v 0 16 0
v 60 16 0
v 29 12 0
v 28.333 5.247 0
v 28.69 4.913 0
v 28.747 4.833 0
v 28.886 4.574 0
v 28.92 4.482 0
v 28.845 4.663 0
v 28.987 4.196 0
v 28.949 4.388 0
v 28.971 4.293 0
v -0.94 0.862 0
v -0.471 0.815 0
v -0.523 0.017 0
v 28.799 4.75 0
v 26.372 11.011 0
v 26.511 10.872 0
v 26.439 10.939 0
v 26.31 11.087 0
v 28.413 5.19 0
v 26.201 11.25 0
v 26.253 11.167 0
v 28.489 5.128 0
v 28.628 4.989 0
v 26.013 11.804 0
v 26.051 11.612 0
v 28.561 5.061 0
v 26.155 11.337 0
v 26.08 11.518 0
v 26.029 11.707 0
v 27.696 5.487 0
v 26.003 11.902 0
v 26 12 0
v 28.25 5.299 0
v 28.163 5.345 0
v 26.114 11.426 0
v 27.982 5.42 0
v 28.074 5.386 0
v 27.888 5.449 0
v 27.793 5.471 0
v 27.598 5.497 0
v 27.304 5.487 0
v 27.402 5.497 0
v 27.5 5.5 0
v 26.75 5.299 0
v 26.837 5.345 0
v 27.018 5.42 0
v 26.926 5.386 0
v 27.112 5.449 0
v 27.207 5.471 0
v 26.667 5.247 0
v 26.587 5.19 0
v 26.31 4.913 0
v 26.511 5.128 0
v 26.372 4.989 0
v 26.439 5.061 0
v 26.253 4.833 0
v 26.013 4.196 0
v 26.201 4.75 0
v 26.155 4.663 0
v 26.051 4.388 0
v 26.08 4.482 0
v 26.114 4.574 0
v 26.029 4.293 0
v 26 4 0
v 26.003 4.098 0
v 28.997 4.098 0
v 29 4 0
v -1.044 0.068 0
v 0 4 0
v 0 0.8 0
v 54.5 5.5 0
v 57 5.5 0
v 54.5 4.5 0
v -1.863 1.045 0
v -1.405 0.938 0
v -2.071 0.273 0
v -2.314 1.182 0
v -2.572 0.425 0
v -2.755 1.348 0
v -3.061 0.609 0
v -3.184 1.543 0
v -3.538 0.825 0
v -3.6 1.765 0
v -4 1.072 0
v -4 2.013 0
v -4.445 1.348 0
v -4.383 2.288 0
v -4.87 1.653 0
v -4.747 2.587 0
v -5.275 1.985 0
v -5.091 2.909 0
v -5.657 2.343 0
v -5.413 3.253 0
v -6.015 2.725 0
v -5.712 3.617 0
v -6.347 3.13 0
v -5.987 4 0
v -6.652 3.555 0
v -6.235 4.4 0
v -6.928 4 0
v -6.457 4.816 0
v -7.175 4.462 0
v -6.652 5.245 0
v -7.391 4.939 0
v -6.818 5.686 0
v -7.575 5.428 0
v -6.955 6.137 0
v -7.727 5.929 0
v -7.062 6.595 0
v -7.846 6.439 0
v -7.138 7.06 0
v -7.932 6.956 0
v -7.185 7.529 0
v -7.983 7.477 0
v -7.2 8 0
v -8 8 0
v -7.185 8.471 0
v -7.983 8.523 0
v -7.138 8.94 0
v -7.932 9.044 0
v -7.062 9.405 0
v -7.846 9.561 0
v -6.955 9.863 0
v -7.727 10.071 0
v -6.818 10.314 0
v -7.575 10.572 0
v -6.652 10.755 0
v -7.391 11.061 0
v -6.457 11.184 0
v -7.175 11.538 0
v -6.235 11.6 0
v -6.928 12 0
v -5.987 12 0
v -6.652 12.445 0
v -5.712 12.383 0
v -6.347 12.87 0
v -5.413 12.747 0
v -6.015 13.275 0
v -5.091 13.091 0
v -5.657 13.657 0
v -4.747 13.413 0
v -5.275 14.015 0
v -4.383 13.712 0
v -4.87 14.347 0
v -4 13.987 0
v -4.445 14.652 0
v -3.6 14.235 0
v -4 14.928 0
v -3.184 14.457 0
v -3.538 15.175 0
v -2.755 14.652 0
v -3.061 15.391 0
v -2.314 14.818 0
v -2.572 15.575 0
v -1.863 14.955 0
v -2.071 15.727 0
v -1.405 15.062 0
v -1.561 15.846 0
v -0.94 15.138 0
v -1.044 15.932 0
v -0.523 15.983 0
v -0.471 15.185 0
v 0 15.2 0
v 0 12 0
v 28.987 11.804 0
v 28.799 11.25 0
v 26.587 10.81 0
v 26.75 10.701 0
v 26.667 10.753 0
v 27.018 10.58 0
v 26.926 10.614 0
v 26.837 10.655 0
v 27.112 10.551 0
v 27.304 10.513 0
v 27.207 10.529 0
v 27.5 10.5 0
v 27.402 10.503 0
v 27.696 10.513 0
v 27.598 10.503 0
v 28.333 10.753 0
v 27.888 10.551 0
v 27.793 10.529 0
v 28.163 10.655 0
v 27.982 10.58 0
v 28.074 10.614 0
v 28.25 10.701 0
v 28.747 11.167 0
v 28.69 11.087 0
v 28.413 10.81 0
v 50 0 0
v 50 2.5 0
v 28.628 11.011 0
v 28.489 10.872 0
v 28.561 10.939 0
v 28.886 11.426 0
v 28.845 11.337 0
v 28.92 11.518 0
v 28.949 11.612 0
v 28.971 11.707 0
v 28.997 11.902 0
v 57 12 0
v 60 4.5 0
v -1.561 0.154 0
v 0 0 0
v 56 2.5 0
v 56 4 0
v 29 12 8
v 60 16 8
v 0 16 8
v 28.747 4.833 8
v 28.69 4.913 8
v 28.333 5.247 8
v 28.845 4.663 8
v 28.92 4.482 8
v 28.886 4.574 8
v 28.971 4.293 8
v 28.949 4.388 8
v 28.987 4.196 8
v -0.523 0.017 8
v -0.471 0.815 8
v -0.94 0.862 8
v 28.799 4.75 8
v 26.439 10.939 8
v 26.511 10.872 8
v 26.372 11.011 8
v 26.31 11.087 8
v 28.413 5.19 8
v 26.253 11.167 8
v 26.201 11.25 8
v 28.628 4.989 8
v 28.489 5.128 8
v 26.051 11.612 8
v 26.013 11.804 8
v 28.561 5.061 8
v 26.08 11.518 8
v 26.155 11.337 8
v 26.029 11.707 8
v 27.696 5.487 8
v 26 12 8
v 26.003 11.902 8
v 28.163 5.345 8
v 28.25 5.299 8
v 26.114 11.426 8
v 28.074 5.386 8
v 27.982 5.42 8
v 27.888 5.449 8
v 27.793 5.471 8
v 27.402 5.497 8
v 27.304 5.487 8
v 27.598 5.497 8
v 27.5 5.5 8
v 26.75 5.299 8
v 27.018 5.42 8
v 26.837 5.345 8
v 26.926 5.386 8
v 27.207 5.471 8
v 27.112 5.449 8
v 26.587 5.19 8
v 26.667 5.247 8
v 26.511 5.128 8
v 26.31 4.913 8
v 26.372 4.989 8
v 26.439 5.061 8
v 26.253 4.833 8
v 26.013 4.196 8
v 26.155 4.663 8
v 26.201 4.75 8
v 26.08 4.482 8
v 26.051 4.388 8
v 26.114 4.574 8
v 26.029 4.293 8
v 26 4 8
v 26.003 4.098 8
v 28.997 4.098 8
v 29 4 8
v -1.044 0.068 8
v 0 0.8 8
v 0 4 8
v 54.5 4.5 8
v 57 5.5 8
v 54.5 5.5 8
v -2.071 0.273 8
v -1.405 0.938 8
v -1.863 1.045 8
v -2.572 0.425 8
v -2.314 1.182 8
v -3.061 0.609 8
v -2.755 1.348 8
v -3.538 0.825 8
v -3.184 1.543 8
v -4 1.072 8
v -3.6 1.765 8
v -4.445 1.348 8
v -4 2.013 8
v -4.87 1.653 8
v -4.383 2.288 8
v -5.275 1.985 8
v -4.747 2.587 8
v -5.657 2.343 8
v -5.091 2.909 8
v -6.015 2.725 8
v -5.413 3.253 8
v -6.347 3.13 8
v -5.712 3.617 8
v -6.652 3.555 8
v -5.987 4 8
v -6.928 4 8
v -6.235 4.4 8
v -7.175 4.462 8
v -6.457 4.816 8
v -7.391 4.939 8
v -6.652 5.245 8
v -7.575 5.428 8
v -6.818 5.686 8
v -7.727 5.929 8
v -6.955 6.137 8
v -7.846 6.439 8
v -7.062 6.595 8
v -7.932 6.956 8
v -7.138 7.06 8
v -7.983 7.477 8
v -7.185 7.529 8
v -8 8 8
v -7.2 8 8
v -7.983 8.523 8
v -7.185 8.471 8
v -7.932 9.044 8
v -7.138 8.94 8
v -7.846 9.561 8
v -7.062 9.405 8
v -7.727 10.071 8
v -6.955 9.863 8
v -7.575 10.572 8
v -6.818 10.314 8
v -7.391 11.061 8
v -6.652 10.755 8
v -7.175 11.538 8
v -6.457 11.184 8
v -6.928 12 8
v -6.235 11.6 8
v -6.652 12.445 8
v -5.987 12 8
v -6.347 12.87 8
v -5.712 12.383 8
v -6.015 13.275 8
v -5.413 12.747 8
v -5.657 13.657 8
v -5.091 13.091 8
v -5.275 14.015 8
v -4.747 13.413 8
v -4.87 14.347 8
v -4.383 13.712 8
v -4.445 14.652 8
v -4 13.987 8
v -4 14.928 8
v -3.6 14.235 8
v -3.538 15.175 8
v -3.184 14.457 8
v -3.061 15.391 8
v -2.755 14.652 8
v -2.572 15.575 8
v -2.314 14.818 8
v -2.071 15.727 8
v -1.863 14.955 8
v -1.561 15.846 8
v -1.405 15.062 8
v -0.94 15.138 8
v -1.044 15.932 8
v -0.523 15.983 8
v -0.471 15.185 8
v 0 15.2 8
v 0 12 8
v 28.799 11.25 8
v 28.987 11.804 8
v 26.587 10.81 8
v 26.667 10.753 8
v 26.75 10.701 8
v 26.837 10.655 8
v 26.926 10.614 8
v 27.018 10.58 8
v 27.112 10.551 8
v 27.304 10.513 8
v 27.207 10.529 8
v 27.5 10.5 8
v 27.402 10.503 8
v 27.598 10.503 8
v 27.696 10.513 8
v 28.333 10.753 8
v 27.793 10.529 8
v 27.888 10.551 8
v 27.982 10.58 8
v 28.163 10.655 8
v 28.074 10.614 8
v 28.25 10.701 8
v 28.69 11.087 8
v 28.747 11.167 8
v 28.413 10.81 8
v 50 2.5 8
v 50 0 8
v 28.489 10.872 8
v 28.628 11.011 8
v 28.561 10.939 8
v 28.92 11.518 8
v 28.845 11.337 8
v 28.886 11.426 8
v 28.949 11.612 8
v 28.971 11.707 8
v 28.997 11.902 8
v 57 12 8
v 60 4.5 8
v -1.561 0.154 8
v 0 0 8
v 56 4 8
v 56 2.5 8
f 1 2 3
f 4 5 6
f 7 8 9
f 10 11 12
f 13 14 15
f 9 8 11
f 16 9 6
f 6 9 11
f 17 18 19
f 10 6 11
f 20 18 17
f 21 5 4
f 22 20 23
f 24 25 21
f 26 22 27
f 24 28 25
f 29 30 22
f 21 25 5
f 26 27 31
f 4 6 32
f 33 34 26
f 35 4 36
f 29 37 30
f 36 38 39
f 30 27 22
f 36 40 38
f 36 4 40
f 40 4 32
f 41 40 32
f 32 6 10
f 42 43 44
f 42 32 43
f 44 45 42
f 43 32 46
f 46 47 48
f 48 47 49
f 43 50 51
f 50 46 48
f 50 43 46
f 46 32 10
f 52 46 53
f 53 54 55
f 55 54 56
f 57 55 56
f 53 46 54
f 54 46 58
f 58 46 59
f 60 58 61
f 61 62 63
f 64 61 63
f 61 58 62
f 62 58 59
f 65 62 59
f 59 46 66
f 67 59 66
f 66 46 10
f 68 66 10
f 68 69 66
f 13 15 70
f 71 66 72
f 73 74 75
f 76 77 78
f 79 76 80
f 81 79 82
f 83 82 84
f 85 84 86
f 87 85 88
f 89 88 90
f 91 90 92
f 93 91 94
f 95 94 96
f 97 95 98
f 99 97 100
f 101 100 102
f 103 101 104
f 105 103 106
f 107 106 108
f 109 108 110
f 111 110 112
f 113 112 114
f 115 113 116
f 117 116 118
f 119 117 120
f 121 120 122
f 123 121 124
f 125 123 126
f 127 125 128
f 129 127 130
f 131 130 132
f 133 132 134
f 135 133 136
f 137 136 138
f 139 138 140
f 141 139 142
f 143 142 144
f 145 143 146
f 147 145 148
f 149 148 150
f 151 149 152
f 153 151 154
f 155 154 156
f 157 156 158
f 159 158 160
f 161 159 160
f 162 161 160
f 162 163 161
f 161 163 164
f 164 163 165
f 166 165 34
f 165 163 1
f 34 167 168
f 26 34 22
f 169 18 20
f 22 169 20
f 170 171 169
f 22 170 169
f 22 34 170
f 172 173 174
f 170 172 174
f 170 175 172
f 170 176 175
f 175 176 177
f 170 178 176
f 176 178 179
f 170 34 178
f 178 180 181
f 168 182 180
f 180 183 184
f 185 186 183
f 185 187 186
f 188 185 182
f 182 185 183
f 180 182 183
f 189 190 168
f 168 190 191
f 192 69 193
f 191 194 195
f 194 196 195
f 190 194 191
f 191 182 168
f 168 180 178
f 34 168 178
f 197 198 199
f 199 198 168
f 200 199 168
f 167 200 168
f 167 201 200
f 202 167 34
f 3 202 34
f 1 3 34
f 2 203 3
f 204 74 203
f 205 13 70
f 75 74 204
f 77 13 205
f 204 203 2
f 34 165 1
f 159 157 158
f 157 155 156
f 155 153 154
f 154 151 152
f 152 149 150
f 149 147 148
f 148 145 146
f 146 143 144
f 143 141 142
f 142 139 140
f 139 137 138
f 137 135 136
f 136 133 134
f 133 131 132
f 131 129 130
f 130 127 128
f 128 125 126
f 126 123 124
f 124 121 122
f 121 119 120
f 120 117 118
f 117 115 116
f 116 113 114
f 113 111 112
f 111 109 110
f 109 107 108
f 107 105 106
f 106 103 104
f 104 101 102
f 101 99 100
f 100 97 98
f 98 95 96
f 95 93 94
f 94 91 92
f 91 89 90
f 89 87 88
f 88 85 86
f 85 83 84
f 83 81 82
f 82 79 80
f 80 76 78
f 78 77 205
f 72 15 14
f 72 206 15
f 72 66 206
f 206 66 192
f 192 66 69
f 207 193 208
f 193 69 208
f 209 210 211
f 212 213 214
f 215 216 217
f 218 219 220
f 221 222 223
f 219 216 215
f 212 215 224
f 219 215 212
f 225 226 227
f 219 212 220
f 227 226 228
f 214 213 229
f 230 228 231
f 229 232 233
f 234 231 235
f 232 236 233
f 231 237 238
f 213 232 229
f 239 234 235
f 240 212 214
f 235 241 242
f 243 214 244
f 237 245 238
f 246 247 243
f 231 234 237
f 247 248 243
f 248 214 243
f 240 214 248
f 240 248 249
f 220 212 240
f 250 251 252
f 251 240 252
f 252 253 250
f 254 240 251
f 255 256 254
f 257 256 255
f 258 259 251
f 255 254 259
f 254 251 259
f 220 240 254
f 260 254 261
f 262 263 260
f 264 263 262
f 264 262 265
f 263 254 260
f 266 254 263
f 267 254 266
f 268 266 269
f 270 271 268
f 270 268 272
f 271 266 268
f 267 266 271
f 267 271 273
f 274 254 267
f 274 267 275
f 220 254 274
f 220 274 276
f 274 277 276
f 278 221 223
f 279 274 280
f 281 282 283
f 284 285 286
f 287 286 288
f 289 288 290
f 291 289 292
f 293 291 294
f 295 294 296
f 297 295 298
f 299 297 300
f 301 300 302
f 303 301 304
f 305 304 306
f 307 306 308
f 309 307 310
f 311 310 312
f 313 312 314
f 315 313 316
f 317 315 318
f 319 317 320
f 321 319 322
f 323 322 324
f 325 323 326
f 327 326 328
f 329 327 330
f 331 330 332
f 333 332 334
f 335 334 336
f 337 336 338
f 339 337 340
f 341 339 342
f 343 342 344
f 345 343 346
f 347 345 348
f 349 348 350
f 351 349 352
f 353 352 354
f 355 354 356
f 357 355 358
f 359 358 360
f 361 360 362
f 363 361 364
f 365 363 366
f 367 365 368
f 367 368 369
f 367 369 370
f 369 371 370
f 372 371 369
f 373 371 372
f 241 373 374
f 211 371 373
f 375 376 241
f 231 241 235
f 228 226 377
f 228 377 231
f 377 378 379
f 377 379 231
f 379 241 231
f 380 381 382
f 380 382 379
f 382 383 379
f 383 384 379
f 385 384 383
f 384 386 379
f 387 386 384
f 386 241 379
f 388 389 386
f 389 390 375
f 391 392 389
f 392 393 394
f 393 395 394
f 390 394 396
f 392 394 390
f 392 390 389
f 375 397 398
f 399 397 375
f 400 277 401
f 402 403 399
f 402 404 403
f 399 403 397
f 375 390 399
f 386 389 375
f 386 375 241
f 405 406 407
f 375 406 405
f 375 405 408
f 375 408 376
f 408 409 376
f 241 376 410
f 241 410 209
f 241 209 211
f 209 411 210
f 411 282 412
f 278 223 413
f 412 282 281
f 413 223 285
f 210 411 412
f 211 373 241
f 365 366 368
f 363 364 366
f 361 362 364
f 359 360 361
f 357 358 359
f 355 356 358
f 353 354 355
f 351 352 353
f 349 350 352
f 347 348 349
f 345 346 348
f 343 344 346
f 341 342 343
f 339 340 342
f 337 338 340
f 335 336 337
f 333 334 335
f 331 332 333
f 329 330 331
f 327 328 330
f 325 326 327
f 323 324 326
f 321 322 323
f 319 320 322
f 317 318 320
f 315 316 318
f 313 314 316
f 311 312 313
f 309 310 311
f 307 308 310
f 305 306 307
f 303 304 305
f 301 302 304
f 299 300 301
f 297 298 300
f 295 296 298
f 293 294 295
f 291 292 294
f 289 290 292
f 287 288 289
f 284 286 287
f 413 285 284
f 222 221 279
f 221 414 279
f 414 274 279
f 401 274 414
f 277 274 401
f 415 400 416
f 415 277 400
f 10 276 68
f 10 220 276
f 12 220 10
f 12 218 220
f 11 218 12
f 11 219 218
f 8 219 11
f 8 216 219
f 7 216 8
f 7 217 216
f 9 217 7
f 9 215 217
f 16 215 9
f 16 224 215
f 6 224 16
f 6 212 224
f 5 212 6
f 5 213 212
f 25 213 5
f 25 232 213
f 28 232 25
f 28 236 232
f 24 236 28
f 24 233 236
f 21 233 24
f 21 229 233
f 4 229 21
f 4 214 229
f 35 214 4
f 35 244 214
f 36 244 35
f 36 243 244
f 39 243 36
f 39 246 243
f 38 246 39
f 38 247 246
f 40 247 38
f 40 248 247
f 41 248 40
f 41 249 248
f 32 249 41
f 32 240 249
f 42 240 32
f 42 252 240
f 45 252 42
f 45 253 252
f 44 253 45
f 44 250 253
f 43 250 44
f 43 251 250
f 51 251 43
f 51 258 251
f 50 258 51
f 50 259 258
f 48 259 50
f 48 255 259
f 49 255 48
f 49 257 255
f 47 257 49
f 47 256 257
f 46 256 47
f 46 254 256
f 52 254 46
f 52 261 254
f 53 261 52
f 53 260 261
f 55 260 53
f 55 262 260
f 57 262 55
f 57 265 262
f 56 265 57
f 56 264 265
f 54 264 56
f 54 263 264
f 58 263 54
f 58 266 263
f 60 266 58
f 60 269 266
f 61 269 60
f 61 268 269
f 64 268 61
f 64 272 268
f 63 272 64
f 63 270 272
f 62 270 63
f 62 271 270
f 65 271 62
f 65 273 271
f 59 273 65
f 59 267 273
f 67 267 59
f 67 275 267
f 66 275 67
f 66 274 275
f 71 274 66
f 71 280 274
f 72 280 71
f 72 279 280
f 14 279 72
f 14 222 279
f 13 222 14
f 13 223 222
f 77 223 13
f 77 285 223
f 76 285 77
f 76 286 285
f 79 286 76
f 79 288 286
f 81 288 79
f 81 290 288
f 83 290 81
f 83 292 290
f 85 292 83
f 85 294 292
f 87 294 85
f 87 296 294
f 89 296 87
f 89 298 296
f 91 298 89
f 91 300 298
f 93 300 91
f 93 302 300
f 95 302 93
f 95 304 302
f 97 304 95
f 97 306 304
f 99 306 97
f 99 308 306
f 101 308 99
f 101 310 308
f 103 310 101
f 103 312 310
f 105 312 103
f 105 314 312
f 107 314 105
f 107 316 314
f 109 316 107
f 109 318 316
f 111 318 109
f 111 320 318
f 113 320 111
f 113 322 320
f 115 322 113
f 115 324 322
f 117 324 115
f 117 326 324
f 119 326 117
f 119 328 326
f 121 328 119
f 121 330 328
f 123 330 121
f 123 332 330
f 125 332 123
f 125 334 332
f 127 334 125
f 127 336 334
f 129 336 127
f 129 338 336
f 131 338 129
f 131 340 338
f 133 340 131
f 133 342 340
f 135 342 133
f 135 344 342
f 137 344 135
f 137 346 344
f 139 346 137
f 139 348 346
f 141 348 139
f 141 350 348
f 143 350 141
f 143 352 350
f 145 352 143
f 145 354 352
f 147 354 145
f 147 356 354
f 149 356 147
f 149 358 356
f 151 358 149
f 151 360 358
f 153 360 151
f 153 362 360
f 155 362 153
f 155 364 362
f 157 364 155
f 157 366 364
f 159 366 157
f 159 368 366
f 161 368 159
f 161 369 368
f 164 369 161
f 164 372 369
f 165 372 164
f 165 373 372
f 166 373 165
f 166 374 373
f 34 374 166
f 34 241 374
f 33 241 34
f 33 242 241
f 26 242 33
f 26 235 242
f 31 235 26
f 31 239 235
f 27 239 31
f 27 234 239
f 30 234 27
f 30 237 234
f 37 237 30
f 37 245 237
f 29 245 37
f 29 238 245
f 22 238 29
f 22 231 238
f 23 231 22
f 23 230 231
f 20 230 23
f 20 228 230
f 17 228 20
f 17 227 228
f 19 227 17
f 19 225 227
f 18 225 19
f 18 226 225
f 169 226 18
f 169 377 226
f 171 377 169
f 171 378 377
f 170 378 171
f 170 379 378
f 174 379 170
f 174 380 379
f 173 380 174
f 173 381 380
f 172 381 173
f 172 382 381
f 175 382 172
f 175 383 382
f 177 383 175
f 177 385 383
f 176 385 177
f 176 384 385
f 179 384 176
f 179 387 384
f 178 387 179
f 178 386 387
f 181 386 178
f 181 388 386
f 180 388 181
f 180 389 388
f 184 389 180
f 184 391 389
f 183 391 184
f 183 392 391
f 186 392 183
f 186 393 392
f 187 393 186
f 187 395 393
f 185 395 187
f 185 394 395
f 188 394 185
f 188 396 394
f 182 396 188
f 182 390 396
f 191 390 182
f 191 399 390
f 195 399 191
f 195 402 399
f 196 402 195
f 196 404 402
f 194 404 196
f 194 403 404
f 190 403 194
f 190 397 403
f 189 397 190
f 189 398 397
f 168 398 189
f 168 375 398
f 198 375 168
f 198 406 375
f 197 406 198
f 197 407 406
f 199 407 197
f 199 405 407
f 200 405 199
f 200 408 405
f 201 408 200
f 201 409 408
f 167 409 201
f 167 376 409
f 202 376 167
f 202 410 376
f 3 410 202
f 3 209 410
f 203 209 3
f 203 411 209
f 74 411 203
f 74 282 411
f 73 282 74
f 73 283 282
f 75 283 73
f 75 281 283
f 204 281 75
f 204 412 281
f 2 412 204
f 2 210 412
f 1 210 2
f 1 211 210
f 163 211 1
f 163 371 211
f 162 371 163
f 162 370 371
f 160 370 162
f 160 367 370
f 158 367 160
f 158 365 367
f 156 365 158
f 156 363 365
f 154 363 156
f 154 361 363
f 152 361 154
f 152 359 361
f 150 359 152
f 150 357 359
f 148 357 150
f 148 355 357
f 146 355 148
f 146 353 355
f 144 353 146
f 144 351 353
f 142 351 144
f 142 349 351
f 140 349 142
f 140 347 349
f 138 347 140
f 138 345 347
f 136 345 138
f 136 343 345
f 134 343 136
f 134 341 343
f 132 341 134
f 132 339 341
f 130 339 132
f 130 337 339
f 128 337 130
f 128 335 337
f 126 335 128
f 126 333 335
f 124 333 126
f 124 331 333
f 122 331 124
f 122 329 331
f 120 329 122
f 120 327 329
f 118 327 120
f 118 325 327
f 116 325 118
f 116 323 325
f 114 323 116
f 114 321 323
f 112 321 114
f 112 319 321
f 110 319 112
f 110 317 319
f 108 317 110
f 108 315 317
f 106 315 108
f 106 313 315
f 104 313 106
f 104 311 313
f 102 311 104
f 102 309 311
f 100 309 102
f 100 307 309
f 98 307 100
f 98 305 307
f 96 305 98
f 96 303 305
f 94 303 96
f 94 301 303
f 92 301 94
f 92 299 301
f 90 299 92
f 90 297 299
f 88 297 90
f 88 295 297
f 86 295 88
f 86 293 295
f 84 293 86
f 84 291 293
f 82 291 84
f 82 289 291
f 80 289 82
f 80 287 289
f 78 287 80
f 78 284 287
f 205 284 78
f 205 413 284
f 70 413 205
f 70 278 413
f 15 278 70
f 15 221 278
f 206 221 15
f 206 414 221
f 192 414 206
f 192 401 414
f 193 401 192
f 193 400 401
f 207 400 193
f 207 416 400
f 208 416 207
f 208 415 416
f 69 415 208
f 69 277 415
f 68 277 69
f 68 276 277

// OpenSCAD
// Pinch clamp for silicone tubing (up to 6.4 mm OD)
// Living hinge + snap latch, printed flat (profile in XY, extruded along Z)

$fn = 96;

// ---- Overall ----
thick        = 8;      // extrusion depth along Z (mm)
eps          = 0.01;   // small overlap to fuse touching features

// ---- Lower jaw ----
lj_x0        = 0;      // lower jaw start x
lj_x1        = 50;     // lower jaw end x
lj_y0        = 0;      // lower jaw bottom y
lj_y1        = 4;      // lower jaw top (inner face) y

// ---- Tongue (end of lower jaw) ----
tg_x0        = 50;     // tongue start x
tg_x1        = 56;     // tongue end x
tg_y0        = 2.5;    // tongue bottom y
tg_y1        = 4;      // tongue top y

// ---- Upper jaw ----
uj_x0        = 0;      // upper jaw start x
uj_x1        = 60;     // upper jaw end x
uj_y0        = 12;     // upper jaw bottom (inner face) y
uj_y1        = 16;     // upper jaw top y

// ---- Living hinge (half-ring, x < 0) ----
hinge_cx     = 0;      // hinge centre x
hinge_cy     = 8;      // hinge centre y
hinge_ri     = 7.2;    // hinge inner radius
hinge_ro     = 8;      // hinge outer radius (0.8 mm wall)

// ---- Pinch ridges ----
ridge_r      = 1.5;    // ridge radius
ridge_x      = 27.5;   // ridge centre x
ridge_ys     = [lj_y1, uj_y0];  // ridge centre y on each jaw inner face

// ---- Latch leg ----
leg_x0       = 57;     // leg start x
leg_x1       = 60;     // leg end x
leg_y0       = 4.5;    // leg bottom y
leg_y1       = 12;     // leg top y (joins upper jaw)

// ---- Latch nose ----
nose_x0      = 54.5;   // nose start x
nose_x1      = 57;     // nose end x (joins leg)
nose_y0      = 4.5;    // nose bottom y (0.5 mm above tongue)
nose_y1      = 5.5;    // nose top y

module rect(x0, y0, x1, y1) {
    translate([x0, y0]) square([x1 - x0, y1 - y0]);
}

module profile() {
    union() {
        // Lower jaw bar
        rect(lj_x0, lj_y0, lj_x1, lj_y1);
        // Tongue (slightly overlapped into the jaw)
        rect(tg_x0 - eps, tg_y0, tg_x1, tg_y1);
        // Upper jaw bar
        rect(uj_x0, uj_y0, uj_x1, uj_y1);

        // Living hinge: half-ring on the x < 0 side
        intersection() {
            translate([hinge_cx, hinge_cy])
                difference() {
                    circle(r = hinge_ro);
                    circle(r = hinge_ri);
                }
            // keep left half, extended slightly into jaws to fuse
            rect(hinge_cx - hinge_ro - 1, hinge_cy - hinge_ro - 1,
                 hinge_cx + eps, hinge_cy + hinge_ro + 1);
        }

        // Pinch ridges (half-rounds; other half buried in jaw)
        for (y = ridge_ys)
            translate([ridge_x, y]) circle(r = ridge_r);

        // Latch leg (overlaps upper jaw slightly)
        rect(leg_x0, leg_y0, leg_x1, leg_y1 + eps);
        // Latch nose (overlaps leg slightly)
        rect(nose_x0, nose_y0, nose_x1 + eps, nose_y1);
    }
}

linear_extrude(height = thick) profile();
